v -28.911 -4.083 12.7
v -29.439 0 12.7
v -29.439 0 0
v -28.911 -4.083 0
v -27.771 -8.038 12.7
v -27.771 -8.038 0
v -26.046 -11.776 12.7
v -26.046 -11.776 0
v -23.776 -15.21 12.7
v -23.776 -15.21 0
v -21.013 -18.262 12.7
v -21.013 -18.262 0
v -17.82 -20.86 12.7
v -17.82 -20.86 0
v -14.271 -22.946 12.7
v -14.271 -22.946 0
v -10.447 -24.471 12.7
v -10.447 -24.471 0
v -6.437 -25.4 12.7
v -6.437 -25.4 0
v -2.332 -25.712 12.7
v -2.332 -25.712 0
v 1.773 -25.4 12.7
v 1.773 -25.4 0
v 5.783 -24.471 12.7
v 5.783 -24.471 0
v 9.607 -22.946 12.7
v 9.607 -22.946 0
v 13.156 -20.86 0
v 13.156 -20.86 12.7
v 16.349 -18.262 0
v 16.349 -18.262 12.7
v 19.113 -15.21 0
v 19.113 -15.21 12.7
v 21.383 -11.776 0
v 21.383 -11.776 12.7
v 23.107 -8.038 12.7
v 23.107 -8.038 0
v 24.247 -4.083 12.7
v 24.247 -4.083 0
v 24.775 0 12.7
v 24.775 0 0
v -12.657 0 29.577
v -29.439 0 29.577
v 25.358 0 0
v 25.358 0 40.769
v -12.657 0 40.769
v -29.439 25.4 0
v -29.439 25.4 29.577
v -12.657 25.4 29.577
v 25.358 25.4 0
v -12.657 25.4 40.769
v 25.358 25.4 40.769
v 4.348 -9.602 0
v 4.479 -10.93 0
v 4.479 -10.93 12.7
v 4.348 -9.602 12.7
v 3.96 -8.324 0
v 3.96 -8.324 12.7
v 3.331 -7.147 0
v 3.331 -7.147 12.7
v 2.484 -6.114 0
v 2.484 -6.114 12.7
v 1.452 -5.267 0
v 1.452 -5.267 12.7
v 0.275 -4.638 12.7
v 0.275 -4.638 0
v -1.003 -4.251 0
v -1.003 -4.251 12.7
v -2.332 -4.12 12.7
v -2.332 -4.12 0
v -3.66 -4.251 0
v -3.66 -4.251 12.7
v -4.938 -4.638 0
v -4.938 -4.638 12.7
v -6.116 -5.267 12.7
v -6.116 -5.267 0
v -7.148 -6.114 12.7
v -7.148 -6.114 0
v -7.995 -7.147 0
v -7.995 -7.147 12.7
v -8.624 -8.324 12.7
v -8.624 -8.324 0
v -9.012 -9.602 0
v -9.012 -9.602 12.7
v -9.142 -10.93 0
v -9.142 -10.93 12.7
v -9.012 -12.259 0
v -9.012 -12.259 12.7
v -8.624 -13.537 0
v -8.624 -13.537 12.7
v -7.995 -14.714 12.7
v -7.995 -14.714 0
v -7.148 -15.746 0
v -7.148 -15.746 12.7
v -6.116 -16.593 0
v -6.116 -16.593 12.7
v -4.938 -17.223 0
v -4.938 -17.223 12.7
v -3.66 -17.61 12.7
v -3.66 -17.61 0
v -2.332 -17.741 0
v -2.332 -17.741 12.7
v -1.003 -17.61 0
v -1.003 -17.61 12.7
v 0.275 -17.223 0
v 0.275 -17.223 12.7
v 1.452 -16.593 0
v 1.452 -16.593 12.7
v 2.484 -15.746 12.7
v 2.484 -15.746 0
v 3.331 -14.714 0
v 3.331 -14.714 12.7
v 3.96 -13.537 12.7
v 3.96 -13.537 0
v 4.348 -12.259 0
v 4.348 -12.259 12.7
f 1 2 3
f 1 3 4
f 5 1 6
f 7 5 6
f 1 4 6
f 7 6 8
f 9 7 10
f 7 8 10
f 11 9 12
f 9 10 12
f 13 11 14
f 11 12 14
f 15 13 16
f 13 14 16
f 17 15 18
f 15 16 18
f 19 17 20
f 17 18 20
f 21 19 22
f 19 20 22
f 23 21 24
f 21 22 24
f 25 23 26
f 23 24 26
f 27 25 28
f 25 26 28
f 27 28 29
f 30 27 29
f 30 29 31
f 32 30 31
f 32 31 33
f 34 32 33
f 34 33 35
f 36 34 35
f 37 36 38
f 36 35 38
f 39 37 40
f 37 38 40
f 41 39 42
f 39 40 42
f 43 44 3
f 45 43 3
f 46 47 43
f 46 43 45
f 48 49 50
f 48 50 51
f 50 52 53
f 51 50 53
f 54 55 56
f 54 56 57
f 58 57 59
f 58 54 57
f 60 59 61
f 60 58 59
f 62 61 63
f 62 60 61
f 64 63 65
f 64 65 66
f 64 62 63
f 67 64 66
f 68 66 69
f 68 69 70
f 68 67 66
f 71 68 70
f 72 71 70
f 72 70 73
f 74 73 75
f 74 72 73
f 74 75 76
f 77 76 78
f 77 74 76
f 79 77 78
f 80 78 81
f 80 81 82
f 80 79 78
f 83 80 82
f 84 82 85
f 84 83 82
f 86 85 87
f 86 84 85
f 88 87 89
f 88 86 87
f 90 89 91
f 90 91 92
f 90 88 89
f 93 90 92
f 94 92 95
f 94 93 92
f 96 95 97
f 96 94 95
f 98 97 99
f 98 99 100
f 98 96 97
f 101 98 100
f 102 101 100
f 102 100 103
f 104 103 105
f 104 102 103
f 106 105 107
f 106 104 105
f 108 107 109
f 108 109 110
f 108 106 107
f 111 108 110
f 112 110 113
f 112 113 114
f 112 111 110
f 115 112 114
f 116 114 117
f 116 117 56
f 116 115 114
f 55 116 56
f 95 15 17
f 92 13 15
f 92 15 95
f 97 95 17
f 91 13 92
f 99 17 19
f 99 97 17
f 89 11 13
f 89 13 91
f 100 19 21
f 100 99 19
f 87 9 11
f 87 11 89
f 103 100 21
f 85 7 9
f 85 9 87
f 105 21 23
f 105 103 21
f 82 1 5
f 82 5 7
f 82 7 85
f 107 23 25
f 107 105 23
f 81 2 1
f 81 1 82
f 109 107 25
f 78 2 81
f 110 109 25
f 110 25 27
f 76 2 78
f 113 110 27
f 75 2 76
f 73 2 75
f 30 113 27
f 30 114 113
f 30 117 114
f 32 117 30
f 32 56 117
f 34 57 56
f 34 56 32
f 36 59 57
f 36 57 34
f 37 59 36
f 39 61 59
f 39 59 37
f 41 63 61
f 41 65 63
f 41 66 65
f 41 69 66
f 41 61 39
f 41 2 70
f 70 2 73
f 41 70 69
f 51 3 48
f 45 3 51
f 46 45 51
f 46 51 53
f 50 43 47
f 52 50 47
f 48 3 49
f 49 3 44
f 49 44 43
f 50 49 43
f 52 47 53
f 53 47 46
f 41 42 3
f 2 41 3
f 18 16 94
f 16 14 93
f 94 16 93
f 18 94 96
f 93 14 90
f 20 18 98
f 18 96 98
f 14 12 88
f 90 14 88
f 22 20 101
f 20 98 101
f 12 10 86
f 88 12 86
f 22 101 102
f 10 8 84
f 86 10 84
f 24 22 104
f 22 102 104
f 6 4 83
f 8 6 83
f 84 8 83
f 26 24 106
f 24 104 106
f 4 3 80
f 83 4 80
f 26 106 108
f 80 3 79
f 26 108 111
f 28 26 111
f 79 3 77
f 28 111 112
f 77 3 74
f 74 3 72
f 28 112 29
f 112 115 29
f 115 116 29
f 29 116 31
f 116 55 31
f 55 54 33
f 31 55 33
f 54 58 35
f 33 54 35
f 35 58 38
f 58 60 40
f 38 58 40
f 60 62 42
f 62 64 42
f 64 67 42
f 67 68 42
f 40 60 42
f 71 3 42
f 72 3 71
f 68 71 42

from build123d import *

# Parameters (mm, degrees)
F0_R     = 6.8106486863
F1_DEPTH = 12.7
F2_W     = 54.7973774374
F2_H     = 40.7694242895
F3_DEPTH = 25.4
F4_W     = 16.7819336057
F4_H     = 11.1922137439
F5_DEPTH = 25.401


with BuildPart() as f1:
    # F0 (on Top) → F1 (new body)
    with BuildSketch(Plane.XY):
        with BuildLine():
            Line((24.775410071, 0), (-29.439015314, 0))
            ThreePointArc((-29.439015314, 0), (-2.3318026215, -25.7123308299), (24.775410071, 0))
        make_face()
        with Locations((-2.3318026215, -10.9303286299)):
            Circle(F0_R, mode=Mode.SUBTRACT)
    extrude(amount=F1_DEPTH)


with BuildPart() as f3:
    # F2 (on Front) → F3 (new body)
    with BuildSketch(Plane.XZ):
        with Locations((-2.0403265953, 20.3847121447)):
            Rectangle(F2_W, F2_H)
    extrude(amount=-F3_DEPTH)

    # F4 (on face) → F5 (cut, through all)
    with BuildSketch(Plane.XZ):
        with Locations((-21.0480485111, 35.1733174175)):
            Rectangle(F4_W, F4_H)
    extrude(amount=-F5_DEPTH, mode=Mode.SUBTRACT)


solid = Compound([f1.part, f3.part])
